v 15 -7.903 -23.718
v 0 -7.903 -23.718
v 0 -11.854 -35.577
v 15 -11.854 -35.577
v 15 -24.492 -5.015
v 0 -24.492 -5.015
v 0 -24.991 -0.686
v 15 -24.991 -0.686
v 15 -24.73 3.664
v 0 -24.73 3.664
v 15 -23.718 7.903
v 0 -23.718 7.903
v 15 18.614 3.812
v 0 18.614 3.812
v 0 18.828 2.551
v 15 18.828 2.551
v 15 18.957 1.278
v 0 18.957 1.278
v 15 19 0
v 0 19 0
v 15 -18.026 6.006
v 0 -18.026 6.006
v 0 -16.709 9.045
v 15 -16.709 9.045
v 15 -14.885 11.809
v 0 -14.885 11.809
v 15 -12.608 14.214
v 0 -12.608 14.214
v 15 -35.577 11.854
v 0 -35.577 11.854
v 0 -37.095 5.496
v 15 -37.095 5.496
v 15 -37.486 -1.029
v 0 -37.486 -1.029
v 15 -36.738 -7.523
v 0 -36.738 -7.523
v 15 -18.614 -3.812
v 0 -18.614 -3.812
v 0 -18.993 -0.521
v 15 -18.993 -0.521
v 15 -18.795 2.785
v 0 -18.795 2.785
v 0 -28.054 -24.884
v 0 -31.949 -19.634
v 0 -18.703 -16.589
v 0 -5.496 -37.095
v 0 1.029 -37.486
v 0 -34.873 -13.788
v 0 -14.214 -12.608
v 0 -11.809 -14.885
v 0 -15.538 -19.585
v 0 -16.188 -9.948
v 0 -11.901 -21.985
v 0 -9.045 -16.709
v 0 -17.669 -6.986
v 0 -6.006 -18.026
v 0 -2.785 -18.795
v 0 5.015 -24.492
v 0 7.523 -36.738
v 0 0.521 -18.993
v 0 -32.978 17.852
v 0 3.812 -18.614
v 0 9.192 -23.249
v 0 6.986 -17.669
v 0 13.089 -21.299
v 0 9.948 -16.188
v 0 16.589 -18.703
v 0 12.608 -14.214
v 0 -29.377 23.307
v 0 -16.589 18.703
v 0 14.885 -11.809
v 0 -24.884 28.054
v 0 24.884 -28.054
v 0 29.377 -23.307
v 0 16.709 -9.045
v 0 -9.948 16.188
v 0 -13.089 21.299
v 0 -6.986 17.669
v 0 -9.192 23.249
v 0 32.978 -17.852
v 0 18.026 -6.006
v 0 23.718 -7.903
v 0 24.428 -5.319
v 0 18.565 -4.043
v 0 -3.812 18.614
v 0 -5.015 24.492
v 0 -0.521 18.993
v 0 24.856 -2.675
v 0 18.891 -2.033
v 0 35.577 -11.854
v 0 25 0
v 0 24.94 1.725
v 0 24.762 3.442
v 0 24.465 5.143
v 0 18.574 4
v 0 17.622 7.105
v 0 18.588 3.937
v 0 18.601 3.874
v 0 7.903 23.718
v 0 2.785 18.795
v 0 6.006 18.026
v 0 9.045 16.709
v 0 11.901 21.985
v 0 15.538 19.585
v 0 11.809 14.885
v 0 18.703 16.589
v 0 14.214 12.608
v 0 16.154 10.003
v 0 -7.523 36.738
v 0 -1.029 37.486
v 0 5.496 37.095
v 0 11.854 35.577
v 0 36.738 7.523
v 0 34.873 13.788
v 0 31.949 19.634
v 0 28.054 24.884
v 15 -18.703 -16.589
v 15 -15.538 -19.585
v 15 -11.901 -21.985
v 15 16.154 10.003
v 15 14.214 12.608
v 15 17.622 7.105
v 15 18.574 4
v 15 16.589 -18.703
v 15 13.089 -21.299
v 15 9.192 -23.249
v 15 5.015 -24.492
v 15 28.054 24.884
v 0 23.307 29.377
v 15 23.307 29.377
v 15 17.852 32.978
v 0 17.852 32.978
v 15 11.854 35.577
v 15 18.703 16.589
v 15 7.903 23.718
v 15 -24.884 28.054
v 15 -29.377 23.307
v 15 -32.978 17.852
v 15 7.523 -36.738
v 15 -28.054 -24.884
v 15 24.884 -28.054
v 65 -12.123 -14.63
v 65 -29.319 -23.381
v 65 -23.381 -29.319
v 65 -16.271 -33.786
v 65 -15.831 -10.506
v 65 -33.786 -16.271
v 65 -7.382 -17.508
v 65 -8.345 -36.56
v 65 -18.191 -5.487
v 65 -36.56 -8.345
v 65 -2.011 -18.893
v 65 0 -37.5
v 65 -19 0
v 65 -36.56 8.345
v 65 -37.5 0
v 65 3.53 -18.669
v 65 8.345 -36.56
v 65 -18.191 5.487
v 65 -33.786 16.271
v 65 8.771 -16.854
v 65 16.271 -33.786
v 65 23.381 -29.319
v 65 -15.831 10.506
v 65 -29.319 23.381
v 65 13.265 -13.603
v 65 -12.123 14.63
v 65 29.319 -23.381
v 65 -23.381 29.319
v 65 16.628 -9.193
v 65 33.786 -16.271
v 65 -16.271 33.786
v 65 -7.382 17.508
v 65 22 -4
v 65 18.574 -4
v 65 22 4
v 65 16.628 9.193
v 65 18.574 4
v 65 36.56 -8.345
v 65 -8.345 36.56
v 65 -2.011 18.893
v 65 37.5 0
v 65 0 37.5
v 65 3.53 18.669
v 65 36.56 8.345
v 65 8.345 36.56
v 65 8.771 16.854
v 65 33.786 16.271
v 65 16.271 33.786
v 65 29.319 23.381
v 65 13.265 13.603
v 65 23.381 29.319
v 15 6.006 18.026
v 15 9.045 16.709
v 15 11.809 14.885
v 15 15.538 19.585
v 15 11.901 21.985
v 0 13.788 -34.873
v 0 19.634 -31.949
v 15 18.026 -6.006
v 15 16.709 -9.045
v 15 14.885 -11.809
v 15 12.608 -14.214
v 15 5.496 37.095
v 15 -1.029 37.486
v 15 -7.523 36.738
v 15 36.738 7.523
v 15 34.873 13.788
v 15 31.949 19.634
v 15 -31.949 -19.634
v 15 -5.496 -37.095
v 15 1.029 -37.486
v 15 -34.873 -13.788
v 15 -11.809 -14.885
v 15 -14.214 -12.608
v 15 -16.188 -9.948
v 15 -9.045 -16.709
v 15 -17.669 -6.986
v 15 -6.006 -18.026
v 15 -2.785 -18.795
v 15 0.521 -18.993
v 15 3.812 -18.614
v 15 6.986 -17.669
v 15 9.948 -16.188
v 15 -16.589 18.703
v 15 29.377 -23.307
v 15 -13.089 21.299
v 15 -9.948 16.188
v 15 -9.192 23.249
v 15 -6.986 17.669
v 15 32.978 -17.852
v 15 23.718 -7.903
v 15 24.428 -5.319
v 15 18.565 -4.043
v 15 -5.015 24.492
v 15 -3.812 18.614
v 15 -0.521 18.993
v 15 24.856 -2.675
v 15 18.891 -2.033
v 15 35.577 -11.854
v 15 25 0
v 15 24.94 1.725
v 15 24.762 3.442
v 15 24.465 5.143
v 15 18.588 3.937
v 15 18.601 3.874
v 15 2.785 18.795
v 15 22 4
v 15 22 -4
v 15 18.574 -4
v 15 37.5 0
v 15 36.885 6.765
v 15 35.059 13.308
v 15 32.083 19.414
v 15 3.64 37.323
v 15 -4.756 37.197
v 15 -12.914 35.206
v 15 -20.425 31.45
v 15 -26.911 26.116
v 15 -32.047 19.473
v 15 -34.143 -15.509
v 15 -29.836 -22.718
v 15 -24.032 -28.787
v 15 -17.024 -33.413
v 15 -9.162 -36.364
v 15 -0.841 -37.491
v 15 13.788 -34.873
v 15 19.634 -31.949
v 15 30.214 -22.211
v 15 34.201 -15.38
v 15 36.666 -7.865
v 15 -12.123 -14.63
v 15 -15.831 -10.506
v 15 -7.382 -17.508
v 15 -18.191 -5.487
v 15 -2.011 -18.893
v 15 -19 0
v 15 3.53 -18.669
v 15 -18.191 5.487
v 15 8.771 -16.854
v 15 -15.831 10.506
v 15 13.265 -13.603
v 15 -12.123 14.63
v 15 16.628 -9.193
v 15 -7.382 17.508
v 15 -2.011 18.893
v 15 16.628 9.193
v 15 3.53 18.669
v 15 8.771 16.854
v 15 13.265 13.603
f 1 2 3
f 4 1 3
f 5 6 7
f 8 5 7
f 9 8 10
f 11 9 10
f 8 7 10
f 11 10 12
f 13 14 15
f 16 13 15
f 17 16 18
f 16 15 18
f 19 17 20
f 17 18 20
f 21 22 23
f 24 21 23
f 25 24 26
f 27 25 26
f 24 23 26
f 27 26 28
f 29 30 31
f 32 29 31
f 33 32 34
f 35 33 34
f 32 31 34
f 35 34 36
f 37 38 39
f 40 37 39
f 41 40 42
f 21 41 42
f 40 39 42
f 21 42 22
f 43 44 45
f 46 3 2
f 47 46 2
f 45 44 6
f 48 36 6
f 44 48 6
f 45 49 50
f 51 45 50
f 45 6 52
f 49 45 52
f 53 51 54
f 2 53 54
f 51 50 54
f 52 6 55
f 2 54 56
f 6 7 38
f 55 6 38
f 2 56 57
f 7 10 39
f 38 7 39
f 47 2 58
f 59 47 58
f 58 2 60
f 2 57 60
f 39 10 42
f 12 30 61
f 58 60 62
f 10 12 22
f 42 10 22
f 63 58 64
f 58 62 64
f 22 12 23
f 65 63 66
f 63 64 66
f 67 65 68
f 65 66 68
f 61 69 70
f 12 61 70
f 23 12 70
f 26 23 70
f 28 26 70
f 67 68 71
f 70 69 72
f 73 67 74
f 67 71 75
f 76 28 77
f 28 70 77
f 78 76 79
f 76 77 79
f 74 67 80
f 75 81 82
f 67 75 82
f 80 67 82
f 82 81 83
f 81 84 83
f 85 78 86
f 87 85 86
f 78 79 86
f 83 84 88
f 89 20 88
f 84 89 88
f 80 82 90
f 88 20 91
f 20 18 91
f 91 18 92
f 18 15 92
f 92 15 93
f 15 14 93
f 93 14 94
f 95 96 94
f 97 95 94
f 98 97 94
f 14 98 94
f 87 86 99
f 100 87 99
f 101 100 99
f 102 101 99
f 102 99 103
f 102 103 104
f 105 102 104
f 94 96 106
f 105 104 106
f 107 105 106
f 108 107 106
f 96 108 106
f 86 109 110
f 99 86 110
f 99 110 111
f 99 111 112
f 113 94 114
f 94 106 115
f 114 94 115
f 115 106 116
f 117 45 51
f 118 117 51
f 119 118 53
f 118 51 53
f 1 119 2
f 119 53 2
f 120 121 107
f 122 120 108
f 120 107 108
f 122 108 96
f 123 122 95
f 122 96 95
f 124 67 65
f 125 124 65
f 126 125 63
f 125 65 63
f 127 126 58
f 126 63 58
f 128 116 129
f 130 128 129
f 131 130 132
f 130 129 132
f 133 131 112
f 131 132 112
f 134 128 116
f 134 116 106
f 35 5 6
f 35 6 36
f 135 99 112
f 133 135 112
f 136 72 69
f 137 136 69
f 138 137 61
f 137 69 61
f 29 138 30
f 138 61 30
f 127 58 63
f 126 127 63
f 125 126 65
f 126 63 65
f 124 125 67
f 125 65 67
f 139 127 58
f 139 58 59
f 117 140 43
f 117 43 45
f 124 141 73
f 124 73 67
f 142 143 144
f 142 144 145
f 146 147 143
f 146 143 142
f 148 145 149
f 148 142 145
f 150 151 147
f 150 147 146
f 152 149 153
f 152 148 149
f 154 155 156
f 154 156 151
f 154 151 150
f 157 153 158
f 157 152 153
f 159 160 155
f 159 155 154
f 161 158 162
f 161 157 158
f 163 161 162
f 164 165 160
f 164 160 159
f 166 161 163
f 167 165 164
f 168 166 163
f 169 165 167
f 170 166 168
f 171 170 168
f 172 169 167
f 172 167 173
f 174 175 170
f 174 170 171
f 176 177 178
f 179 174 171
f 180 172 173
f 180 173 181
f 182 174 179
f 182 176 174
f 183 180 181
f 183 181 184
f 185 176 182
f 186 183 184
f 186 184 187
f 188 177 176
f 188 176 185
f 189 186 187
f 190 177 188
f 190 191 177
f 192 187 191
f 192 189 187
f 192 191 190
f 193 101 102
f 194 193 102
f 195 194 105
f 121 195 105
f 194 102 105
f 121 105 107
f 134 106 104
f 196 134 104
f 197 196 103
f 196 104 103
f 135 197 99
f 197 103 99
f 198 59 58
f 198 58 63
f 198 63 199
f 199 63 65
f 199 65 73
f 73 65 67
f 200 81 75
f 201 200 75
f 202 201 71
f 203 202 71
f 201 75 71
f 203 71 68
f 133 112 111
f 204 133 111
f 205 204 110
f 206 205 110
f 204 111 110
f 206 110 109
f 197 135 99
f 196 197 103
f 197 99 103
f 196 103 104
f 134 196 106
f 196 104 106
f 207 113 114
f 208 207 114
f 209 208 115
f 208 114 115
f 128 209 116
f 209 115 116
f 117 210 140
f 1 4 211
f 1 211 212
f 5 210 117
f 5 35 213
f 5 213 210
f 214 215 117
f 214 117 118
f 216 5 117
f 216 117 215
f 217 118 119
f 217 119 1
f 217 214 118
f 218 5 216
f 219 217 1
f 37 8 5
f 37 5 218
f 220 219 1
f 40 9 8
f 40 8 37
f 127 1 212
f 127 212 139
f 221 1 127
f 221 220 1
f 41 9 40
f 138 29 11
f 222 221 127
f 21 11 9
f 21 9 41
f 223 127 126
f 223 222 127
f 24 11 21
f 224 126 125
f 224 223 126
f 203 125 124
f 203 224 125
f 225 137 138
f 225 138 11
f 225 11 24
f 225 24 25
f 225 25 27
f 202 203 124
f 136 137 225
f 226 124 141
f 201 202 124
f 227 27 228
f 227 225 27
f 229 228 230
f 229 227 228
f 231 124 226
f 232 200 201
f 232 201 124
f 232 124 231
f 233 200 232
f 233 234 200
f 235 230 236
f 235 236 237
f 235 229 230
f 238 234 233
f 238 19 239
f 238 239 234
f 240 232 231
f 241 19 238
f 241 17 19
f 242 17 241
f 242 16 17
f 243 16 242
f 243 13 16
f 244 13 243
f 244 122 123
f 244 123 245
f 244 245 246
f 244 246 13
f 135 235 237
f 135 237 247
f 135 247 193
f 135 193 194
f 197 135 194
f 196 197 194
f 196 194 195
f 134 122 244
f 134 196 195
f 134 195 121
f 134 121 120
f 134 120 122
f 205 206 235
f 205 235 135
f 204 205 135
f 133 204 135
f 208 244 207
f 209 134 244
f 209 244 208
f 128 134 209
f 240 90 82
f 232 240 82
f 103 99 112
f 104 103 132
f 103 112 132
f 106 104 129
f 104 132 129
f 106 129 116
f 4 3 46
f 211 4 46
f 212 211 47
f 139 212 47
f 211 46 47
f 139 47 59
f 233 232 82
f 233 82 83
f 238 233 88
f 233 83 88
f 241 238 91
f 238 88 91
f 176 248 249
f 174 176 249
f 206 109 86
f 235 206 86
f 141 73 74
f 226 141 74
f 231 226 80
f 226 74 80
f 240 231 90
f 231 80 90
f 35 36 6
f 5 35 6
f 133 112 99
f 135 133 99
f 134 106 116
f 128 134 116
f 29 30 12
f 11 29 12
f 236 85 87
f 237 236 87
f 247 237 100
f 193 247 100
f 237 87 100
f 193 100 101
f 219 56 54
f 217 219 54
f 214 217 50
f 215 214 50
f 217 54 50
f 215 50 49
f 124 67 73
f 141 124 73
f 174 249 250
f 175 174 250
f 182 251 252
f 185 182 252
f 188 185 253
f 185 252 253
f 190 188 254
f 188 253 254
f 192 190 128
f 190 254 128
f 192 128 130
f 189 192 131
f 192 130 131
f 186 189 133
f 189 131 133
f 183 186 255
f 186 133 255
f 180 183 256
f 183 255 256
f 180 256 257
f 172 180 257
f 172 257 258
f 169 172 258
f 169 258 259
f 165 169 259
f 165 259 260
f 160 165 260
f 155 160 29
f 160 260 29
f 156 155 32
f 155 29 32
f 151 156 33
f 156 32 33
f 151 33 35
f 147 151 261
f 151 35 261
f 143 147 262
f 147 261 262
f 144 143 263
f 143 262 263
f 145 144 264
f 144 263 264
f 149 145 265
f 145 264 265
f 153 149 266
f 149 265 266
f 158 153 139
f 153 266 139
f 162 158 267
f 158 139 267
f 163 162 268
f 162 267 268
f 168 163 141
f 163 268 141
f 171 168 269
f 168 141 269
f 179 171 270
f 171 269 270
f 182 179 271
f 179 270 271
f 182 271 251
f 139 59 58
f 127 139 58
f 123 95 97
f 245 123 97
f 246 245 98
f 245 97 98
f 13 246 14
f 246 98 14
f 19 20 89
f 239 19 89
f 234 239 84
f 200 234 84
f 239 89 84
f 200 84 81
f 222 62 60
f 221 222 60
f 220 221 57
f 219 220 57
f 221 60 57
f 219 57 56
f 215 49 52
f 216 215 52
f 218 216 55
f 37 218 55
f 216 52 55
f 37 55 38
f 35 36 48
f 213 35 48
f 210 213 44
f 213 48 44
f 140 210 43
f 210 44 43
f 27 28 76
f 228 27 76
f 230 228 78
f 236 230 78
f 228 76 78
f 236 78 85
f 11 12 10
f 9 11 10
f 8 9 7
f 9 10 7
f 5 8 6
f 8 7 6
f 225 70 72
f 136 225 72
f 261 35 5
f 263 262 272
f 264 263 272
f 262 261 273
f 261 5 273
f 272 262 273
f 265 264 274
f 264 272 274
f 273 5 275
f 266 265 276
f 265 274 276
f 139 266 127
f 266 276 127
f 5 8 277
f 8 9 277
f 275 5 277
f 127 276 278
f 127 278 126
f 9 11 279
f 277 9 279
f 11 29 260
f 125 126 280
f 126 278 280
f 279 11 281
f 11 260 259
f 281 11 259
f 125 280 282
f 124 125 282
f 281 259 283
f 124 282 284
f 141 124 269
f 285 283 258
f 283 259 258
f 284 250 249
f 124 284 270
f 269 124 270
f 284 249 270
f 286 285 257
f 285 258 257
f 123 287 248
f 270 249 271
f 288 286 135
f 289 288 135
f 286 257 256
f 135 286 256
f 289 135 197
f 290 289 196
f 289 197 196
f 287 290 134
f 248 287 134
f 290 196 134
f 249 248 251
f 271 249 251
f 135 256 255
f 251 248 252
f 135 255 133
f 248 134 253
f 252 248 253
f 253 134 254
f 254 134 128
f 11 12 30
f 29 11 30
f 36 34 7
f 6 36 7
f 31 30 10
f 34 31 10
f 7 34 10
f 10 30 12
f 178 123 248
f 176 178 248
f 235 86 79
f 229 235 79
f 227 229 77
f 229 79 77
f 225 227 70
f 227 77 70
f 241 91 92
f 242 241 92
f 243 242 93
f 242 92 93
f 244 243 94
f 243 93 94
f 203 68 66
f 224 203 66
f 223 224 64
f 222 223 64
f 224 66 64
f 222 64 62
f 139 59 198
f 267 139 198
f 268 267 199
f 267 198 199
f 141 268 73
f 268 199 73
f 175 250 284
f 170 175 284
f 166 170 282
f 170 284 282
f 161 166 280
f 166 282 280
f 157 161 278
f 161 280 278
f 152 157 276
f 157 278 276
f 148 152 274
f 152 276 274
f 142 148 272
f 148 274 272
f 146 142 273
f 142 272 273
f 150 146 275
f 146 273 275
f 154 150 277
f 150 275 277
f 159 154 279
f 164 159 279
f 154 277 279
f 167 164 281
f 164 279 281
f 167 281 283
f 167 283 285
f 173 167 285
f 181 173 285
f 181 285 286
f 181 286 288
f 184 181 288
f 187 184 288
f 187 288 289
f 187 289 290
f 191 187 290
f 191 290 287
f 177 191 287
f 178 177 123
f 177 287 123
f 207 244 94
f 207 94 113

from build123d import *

# Parameters (mm, degrees)
F1_R     = 37.5
F2_DEPTH = 50
F4_DEPTH = 15
F5_DEPTH = 15


with BuildPart() as f2:
    # F1 (on offset) → F2 (new body)
    with BuildSketch(Plane.YZ.offset(15)):
        Circle(F1_R)
        with BuildLine():
            ThreePointArc((18.574175621, -4), (-19, 0), (18.574175621, 4))
            Line((18.574175621, 4), (22, 4))
            Line((22, 4), (22, -4))
            Line((22, -4), (18.574175621, -4))
        make_face(mode=Mode.SUBTRACT)
    extrude(amount=F2_DEPTH)

    # F3 (on Right) → F4 (join, through all)
    with BuildSketch(Plane.YZ):
        with BuildLine():
            ThreePointArc((7.5227650439, -36.7376918994), (16.7748473777, -33.5388505387), (24.8837515844, -28.0543919393))
            Line((24.8837515844, -28.0543919393), (16.589167723, -18.7029279595))
            ThreePointArc((16.589167723, -18.7029279595), (11.1832315851, -22.3592336924), (5.015176696, -24.4917945996))
            Line((5.015176696, -24.4917945996), (7.5227650439, -36.7376918994))
        make_face()
        with BuildLine():
            Line((-23.7181046555, 7.9026268766), (-35.5771569832, 11.8539403149))
            ThreePointArc((-35.5771569832, 11.8539403149), (-37.4329202691, 2.2419812956), (-36.7376918994, -7.5227650439))
            Line((-36.7376918994, -7.5227650439), (-24.4917945996, -5.015176696))
            ThreePointArc((-24.4917945996, -5.015176696), (-24.9552801794, 1.4946541971), (-23.7181046555, 7.9026268766))
        make_face()
        with BuildLine():
            Line((18.7029279595, 16.589167723), (28.0543919393, 24.8837515844))
            ThreePointArc((28.0543919393, 24.8837515844), (20.6580728914, 31.296869243), (11.8539403149, 35.5771569832))
            Line((11.8539403149, 35.5771569832), (7.9026268766, 23.7181046555))
            ThreePointArc((7.9026268766, 23.7181046555), (13.7720485942, 20.8645794954), (18.7029279595, 16.589167723))
        make_face()
    extrude(amount=F4_DEPTH)


with BuildPart() as f5:
    # F3 (on Right) → F5 (new body, through all)
    with BuildSketch(Plane.YZ):
        with BuildLine():
            Line((7.9026268766, 23.7181046555), (11.8539403149, 35.5771569832))
            ThreePointArc((11.8539403149, 35.5771569832), (2.2419812956, 37.4329202691), (-7.5227650439, 36.7376918994))
            Line((-7.5227650439, 36.7376918994), (-5.015176696, 24.4917945996))
            ThreePointArc((-5.015176696, 24.4917945996), (1.4946541971, 24.9552801794), (7.9026268766, 23.7181046555))
        make_face()
        with BuildLine():
            Line((-16.589167723, 18.7029279595), (-24.8837515844, 28.0543919393))
            ThreePointArc((-24.8837515844, 28.0543919393), (-31.296869243, 20.6580728914), (-35.5771569832, 11.8539403149))
            Line((-35.5771569832, 11.8539403149), (-23.7181046555, 7.9026268766))
            ThreePointArc((-23.7181046555, 7.9026268766), (-20.8645794954, 13.7720485942), (-16.589167723, 18.7029279595))
        make_face()
        with BuildLine():
            ThreePointArc((-36.7376918994, -7.5227650439), (-33.5388505387, -16.7748473777), (-28.0543919393, -24.8837515844))
            Line((-28.0543919393, -24.8837515844), (-18.7029279595, -16.589167723))
            ThreePointArc((-18.7029279595, -16.589167723), (-22.3592336924, -11.1832315851), (-24.4917945996, -5.015176696))
            Line((-24.4917945996, -5.015176696), (-36.7376918994, -7.5227650439))
        make_face()
        with BuildLine():
            ThreePointArc((-11.8539403149, -35.5771569832), (-2.2419812956, -37.4329202691), (7.5227650439, -36.7376918994))
            Line((7.5227650439, -36.7376918994), (5.015176696, -24.4917945996))
            ThreePointArc((5.015176696, -24.4917945996), (-1.4946541971, -24.9552801794), (-7.9026268766, -23.7181046555))
            Line((-7.9026268766, -23.7181046555), (-11.8539403149, -35.5771569832))
        make_face()
        with BuildLine():
            ThreePointArc((24.8837515844, -28.0543919393), (31.296869243, -20.6580728914), (35.5771569832, -11.8539403149))
            Line((35.5771569832, -11.8539403149), (23.7181046555, -7.9026268766))
            ThreePointArc((23.7181046555, -7.9026268766), (20.8645794954, -13.7720485942), (16.589167723, -18.7029279595))
            Line((16.589167723, -18.7029279595), (24.8837515844, -28.0543919393))
        make_face()
        with BuildLine():
            Line((24.4653607428, 5.1425794817), (36.7376918994, 7.5227650439))
            ThreePointArc((36.7376918994, 7.5227650439), (33.5388505387, 16.7748473777), (28.0543919393, 24.8837515844))
            Line((28.0543919393, 24.8837515844), (18.7029279595, 16.589167723))
            ThreePointArc((18.7029279595, 16.589167723), (22.330055597, 11.2413796767), (24.4653607428, 5.1425794817))
        make_face()
        with BuildLine():
            Line((18.574175621, 4), (24.4653607428, 5.1425794817))
            ThreePointArc((24.4653607428, 5.1425794817), (22.330055597, 11.2413796767), (18.7029279595, 16.589167723))
            Line((18.7029279595, 16.589167723), (14.2142252492, 12.6077674694))
            ThreePointArc((14.2142252492, 12.6077674694), (16.9497263432, 8.5852651031), (18.574175621, 4))
        make_face()
        with BuildLine():
            Line((14.2142252492, 12.6077674694), (18.7029279595, 16.589167723))
            ThreePointArc((18.7029279595, 16.589167723), (13.7720485942, 20.8645794954), (7.9026268766, 23.7181046555))
            Line((7.9026268766, 23.7181046555), (6.0059964262, 18.0257595382))
            ThreePointArc((6.0059964262, 18.0257595382), (10.4667569316, 15.8570804165), (14.2142252492, 12.6077674694))
        make_face()
        with BuildLine():
            Line((6.0059964262, 18.0257595382), (7.9026268766, 23.7181046555))
            ThreePointArc((7.9026268766, 23.7181046555), (1.4946541971, 24.9552801794), (-5.015176696, 24.4917945996))
            Line((-5.015176696, 24.4917945996), (-3.8115342889, 18.6137638957))
            ThreePointArc((-3.8115342889, 18.6137638957), (1.1359371898, 18.9660129363), (6.0059964262, 18.0257595382))
        make_face()
        with BuildLine():
            Line((-3.8115342889, 18.6137638957), (-5.015176696, 24.4917945996))
            ThreePointArc((-5.015176696, 24.4917945996), (-11.1832315851, 22.3592336924), (-16.589167723, 18.7029279595))
            Line((-16.589167723, 18.7029279595), (-12.6077674694, 14.2142252492))
            ThreePointArc((-12.6077674694, 14.2142252492), (-8.4992560047, 16.9930176063), (-3.8115342889, 18.6137638957))
        make_face()
        with BuildLine():
            Line((-12.6077674694, 14.2142252492), (-16.589167723, 18.7029279595))
            ThreePointArc((-16.589167723, 18.7029279595), (-20.8645794954, 13.7720485942), (-23.7181046555, 7.9026268766))
            Line((-23.7181046555, 7.9026268766), (-18.0257595382, 6.0059964262))
            ThreePointArc((-18.0257595382, 6.0059964262), (-15.8570804165, 10.4667569316), (-12.6077674694, 14.2142252492))
        make_face()
        with BuildLine():
            Line((-18.0257595382, 6.0059964262), (-23.7181046555, 7.9026268766))
            ThreePointArc((-23.7181046555, 7.9026268766), (-24.9552801794, 1.4946541971), (-24.4917945996, -5.015176696))
            Line((-24.4917945996, -5.015176696), (-18.6137638957, -3.8115342889))
            ThreePointArc((-18.6137638957, -3.8115342889), (-18.9660129363, 1.1359371898), (-18.0257595382, 6.0059964262))
        make_face()
        with BuildLine():
            ThreePointArc((-24.4917945996, -5.015176696), (-22.3592336924, -11.1832315851), (-18.7029279595, -16.589167723))
            Line((-18.7029279595, -16.589167723), (-14.2142252492, -12.6077674694))
            ThreePointArc((-14.2142252492, -12.6077674694), (-16.9930176063, -8.4992560047), (-18.6137638957, -3.8115342889))
            Line((-18.6137638957, -3.8115342889), (-24.4917945996, -5.015176696))
        make_face()
        with BuildLine():
            ThreePointArc((-18.7029279595, -16.589167723), (-13.7720485942, -20.8645794954), (-7.9026268766, -23.7181046555))
            Line((-7.9026268766, -23.7181046555), (-6.0059964262, -18.0257595382))
            ThreePointArc((-6.0059964262, -18.0257595382), (-10.4667569316, -15.8570804165), (-14.2142252492, -12.6077674694))
            Line((-14.2142252492, -12.6077674694), (-18.7029279595, -16.589167723))
        make_face()
        with BuildLine():
            ThreePointArc((-7.9026268766, -23.7181046555), (-1.4946541971, -24.9552801794), (5.015176696, -24.4917945996))
            Line((5.015176696, -24.4917945996), (3.8115342889, -18.6137638957))
            ThreePointArc((3.8115342889, -18.6137638957), (-1.1359371898, -18.9660129363), (-6.0059964262, -18.0257595382))
            Line((-6.0059964262, -18.0257595382), (-7.9026268766, -23.7181046555))
        make_face()
        with BuildLine():
            ThreePointArc((5.015176696, -24.4917945996), (11.1832315851, -22.3592336924), (16.589167723, -18.7029279595))
            Line((16.589167723, -18.7029279595), (12.6077674694, -14.2142252492))
            ThreePointArc((12.6077674694, -14.2142252492), (8.4992560047, -16.9930176063), (3.8115342889, -18.6137638957))
            Line((3.8115342889, -18.6137638957), (5.015176696, -24.4917945996))
        make_face()
        with BuildLine():
            ThreePointArc((16.589167723, -18.7029279595), (20.8645794954, -13.7720485942), (23.7181046555, -7.9026268766))
            Line((23.7181046555, -7.9026268766), (18.0257595382, -6.0059964262))
            ThreePointArc((18.0257595382, -6.0059964262), (15.8570804165, -10.4667569316), (12.6077674694, -14.2142252492))
            Line((12.6077674694, -14.2142252492), (16.589167723, -18.7029279595))
        make_face()
        with BuildLine():
            ThreePointArc((25, 0), (24.8659809637, 2.5851481031), (24.4653607428, 5.1425794817))
            Line((24.4653607428, 5.1425794817), (18.574175621, 4))
            ThreePointArc((18.574175621, 4), (18.5942085394, 3.9058173017), (18.6137638957, 3.8115342889))
            ThreePointArc((18.6137638957, 3.8115342889), (18.9031943599, 1.9155268181), (19, 0))
            ThreePointArc((19, 0), (18.7548584535, -3.042249889), (18.0257595382, -6.0059964262))
            Line((18.0257595382, -6.0059964262), (23.7181046555, -7.9026268766))
            ThreePointArc((23.7181046555, -7.9026268766), (24.6774453336, -4.0029603803), (25, 0))
        make_face()
    extrude(amount=F5_DEPTH)


solid = Compound([f2.part, f5.part])
